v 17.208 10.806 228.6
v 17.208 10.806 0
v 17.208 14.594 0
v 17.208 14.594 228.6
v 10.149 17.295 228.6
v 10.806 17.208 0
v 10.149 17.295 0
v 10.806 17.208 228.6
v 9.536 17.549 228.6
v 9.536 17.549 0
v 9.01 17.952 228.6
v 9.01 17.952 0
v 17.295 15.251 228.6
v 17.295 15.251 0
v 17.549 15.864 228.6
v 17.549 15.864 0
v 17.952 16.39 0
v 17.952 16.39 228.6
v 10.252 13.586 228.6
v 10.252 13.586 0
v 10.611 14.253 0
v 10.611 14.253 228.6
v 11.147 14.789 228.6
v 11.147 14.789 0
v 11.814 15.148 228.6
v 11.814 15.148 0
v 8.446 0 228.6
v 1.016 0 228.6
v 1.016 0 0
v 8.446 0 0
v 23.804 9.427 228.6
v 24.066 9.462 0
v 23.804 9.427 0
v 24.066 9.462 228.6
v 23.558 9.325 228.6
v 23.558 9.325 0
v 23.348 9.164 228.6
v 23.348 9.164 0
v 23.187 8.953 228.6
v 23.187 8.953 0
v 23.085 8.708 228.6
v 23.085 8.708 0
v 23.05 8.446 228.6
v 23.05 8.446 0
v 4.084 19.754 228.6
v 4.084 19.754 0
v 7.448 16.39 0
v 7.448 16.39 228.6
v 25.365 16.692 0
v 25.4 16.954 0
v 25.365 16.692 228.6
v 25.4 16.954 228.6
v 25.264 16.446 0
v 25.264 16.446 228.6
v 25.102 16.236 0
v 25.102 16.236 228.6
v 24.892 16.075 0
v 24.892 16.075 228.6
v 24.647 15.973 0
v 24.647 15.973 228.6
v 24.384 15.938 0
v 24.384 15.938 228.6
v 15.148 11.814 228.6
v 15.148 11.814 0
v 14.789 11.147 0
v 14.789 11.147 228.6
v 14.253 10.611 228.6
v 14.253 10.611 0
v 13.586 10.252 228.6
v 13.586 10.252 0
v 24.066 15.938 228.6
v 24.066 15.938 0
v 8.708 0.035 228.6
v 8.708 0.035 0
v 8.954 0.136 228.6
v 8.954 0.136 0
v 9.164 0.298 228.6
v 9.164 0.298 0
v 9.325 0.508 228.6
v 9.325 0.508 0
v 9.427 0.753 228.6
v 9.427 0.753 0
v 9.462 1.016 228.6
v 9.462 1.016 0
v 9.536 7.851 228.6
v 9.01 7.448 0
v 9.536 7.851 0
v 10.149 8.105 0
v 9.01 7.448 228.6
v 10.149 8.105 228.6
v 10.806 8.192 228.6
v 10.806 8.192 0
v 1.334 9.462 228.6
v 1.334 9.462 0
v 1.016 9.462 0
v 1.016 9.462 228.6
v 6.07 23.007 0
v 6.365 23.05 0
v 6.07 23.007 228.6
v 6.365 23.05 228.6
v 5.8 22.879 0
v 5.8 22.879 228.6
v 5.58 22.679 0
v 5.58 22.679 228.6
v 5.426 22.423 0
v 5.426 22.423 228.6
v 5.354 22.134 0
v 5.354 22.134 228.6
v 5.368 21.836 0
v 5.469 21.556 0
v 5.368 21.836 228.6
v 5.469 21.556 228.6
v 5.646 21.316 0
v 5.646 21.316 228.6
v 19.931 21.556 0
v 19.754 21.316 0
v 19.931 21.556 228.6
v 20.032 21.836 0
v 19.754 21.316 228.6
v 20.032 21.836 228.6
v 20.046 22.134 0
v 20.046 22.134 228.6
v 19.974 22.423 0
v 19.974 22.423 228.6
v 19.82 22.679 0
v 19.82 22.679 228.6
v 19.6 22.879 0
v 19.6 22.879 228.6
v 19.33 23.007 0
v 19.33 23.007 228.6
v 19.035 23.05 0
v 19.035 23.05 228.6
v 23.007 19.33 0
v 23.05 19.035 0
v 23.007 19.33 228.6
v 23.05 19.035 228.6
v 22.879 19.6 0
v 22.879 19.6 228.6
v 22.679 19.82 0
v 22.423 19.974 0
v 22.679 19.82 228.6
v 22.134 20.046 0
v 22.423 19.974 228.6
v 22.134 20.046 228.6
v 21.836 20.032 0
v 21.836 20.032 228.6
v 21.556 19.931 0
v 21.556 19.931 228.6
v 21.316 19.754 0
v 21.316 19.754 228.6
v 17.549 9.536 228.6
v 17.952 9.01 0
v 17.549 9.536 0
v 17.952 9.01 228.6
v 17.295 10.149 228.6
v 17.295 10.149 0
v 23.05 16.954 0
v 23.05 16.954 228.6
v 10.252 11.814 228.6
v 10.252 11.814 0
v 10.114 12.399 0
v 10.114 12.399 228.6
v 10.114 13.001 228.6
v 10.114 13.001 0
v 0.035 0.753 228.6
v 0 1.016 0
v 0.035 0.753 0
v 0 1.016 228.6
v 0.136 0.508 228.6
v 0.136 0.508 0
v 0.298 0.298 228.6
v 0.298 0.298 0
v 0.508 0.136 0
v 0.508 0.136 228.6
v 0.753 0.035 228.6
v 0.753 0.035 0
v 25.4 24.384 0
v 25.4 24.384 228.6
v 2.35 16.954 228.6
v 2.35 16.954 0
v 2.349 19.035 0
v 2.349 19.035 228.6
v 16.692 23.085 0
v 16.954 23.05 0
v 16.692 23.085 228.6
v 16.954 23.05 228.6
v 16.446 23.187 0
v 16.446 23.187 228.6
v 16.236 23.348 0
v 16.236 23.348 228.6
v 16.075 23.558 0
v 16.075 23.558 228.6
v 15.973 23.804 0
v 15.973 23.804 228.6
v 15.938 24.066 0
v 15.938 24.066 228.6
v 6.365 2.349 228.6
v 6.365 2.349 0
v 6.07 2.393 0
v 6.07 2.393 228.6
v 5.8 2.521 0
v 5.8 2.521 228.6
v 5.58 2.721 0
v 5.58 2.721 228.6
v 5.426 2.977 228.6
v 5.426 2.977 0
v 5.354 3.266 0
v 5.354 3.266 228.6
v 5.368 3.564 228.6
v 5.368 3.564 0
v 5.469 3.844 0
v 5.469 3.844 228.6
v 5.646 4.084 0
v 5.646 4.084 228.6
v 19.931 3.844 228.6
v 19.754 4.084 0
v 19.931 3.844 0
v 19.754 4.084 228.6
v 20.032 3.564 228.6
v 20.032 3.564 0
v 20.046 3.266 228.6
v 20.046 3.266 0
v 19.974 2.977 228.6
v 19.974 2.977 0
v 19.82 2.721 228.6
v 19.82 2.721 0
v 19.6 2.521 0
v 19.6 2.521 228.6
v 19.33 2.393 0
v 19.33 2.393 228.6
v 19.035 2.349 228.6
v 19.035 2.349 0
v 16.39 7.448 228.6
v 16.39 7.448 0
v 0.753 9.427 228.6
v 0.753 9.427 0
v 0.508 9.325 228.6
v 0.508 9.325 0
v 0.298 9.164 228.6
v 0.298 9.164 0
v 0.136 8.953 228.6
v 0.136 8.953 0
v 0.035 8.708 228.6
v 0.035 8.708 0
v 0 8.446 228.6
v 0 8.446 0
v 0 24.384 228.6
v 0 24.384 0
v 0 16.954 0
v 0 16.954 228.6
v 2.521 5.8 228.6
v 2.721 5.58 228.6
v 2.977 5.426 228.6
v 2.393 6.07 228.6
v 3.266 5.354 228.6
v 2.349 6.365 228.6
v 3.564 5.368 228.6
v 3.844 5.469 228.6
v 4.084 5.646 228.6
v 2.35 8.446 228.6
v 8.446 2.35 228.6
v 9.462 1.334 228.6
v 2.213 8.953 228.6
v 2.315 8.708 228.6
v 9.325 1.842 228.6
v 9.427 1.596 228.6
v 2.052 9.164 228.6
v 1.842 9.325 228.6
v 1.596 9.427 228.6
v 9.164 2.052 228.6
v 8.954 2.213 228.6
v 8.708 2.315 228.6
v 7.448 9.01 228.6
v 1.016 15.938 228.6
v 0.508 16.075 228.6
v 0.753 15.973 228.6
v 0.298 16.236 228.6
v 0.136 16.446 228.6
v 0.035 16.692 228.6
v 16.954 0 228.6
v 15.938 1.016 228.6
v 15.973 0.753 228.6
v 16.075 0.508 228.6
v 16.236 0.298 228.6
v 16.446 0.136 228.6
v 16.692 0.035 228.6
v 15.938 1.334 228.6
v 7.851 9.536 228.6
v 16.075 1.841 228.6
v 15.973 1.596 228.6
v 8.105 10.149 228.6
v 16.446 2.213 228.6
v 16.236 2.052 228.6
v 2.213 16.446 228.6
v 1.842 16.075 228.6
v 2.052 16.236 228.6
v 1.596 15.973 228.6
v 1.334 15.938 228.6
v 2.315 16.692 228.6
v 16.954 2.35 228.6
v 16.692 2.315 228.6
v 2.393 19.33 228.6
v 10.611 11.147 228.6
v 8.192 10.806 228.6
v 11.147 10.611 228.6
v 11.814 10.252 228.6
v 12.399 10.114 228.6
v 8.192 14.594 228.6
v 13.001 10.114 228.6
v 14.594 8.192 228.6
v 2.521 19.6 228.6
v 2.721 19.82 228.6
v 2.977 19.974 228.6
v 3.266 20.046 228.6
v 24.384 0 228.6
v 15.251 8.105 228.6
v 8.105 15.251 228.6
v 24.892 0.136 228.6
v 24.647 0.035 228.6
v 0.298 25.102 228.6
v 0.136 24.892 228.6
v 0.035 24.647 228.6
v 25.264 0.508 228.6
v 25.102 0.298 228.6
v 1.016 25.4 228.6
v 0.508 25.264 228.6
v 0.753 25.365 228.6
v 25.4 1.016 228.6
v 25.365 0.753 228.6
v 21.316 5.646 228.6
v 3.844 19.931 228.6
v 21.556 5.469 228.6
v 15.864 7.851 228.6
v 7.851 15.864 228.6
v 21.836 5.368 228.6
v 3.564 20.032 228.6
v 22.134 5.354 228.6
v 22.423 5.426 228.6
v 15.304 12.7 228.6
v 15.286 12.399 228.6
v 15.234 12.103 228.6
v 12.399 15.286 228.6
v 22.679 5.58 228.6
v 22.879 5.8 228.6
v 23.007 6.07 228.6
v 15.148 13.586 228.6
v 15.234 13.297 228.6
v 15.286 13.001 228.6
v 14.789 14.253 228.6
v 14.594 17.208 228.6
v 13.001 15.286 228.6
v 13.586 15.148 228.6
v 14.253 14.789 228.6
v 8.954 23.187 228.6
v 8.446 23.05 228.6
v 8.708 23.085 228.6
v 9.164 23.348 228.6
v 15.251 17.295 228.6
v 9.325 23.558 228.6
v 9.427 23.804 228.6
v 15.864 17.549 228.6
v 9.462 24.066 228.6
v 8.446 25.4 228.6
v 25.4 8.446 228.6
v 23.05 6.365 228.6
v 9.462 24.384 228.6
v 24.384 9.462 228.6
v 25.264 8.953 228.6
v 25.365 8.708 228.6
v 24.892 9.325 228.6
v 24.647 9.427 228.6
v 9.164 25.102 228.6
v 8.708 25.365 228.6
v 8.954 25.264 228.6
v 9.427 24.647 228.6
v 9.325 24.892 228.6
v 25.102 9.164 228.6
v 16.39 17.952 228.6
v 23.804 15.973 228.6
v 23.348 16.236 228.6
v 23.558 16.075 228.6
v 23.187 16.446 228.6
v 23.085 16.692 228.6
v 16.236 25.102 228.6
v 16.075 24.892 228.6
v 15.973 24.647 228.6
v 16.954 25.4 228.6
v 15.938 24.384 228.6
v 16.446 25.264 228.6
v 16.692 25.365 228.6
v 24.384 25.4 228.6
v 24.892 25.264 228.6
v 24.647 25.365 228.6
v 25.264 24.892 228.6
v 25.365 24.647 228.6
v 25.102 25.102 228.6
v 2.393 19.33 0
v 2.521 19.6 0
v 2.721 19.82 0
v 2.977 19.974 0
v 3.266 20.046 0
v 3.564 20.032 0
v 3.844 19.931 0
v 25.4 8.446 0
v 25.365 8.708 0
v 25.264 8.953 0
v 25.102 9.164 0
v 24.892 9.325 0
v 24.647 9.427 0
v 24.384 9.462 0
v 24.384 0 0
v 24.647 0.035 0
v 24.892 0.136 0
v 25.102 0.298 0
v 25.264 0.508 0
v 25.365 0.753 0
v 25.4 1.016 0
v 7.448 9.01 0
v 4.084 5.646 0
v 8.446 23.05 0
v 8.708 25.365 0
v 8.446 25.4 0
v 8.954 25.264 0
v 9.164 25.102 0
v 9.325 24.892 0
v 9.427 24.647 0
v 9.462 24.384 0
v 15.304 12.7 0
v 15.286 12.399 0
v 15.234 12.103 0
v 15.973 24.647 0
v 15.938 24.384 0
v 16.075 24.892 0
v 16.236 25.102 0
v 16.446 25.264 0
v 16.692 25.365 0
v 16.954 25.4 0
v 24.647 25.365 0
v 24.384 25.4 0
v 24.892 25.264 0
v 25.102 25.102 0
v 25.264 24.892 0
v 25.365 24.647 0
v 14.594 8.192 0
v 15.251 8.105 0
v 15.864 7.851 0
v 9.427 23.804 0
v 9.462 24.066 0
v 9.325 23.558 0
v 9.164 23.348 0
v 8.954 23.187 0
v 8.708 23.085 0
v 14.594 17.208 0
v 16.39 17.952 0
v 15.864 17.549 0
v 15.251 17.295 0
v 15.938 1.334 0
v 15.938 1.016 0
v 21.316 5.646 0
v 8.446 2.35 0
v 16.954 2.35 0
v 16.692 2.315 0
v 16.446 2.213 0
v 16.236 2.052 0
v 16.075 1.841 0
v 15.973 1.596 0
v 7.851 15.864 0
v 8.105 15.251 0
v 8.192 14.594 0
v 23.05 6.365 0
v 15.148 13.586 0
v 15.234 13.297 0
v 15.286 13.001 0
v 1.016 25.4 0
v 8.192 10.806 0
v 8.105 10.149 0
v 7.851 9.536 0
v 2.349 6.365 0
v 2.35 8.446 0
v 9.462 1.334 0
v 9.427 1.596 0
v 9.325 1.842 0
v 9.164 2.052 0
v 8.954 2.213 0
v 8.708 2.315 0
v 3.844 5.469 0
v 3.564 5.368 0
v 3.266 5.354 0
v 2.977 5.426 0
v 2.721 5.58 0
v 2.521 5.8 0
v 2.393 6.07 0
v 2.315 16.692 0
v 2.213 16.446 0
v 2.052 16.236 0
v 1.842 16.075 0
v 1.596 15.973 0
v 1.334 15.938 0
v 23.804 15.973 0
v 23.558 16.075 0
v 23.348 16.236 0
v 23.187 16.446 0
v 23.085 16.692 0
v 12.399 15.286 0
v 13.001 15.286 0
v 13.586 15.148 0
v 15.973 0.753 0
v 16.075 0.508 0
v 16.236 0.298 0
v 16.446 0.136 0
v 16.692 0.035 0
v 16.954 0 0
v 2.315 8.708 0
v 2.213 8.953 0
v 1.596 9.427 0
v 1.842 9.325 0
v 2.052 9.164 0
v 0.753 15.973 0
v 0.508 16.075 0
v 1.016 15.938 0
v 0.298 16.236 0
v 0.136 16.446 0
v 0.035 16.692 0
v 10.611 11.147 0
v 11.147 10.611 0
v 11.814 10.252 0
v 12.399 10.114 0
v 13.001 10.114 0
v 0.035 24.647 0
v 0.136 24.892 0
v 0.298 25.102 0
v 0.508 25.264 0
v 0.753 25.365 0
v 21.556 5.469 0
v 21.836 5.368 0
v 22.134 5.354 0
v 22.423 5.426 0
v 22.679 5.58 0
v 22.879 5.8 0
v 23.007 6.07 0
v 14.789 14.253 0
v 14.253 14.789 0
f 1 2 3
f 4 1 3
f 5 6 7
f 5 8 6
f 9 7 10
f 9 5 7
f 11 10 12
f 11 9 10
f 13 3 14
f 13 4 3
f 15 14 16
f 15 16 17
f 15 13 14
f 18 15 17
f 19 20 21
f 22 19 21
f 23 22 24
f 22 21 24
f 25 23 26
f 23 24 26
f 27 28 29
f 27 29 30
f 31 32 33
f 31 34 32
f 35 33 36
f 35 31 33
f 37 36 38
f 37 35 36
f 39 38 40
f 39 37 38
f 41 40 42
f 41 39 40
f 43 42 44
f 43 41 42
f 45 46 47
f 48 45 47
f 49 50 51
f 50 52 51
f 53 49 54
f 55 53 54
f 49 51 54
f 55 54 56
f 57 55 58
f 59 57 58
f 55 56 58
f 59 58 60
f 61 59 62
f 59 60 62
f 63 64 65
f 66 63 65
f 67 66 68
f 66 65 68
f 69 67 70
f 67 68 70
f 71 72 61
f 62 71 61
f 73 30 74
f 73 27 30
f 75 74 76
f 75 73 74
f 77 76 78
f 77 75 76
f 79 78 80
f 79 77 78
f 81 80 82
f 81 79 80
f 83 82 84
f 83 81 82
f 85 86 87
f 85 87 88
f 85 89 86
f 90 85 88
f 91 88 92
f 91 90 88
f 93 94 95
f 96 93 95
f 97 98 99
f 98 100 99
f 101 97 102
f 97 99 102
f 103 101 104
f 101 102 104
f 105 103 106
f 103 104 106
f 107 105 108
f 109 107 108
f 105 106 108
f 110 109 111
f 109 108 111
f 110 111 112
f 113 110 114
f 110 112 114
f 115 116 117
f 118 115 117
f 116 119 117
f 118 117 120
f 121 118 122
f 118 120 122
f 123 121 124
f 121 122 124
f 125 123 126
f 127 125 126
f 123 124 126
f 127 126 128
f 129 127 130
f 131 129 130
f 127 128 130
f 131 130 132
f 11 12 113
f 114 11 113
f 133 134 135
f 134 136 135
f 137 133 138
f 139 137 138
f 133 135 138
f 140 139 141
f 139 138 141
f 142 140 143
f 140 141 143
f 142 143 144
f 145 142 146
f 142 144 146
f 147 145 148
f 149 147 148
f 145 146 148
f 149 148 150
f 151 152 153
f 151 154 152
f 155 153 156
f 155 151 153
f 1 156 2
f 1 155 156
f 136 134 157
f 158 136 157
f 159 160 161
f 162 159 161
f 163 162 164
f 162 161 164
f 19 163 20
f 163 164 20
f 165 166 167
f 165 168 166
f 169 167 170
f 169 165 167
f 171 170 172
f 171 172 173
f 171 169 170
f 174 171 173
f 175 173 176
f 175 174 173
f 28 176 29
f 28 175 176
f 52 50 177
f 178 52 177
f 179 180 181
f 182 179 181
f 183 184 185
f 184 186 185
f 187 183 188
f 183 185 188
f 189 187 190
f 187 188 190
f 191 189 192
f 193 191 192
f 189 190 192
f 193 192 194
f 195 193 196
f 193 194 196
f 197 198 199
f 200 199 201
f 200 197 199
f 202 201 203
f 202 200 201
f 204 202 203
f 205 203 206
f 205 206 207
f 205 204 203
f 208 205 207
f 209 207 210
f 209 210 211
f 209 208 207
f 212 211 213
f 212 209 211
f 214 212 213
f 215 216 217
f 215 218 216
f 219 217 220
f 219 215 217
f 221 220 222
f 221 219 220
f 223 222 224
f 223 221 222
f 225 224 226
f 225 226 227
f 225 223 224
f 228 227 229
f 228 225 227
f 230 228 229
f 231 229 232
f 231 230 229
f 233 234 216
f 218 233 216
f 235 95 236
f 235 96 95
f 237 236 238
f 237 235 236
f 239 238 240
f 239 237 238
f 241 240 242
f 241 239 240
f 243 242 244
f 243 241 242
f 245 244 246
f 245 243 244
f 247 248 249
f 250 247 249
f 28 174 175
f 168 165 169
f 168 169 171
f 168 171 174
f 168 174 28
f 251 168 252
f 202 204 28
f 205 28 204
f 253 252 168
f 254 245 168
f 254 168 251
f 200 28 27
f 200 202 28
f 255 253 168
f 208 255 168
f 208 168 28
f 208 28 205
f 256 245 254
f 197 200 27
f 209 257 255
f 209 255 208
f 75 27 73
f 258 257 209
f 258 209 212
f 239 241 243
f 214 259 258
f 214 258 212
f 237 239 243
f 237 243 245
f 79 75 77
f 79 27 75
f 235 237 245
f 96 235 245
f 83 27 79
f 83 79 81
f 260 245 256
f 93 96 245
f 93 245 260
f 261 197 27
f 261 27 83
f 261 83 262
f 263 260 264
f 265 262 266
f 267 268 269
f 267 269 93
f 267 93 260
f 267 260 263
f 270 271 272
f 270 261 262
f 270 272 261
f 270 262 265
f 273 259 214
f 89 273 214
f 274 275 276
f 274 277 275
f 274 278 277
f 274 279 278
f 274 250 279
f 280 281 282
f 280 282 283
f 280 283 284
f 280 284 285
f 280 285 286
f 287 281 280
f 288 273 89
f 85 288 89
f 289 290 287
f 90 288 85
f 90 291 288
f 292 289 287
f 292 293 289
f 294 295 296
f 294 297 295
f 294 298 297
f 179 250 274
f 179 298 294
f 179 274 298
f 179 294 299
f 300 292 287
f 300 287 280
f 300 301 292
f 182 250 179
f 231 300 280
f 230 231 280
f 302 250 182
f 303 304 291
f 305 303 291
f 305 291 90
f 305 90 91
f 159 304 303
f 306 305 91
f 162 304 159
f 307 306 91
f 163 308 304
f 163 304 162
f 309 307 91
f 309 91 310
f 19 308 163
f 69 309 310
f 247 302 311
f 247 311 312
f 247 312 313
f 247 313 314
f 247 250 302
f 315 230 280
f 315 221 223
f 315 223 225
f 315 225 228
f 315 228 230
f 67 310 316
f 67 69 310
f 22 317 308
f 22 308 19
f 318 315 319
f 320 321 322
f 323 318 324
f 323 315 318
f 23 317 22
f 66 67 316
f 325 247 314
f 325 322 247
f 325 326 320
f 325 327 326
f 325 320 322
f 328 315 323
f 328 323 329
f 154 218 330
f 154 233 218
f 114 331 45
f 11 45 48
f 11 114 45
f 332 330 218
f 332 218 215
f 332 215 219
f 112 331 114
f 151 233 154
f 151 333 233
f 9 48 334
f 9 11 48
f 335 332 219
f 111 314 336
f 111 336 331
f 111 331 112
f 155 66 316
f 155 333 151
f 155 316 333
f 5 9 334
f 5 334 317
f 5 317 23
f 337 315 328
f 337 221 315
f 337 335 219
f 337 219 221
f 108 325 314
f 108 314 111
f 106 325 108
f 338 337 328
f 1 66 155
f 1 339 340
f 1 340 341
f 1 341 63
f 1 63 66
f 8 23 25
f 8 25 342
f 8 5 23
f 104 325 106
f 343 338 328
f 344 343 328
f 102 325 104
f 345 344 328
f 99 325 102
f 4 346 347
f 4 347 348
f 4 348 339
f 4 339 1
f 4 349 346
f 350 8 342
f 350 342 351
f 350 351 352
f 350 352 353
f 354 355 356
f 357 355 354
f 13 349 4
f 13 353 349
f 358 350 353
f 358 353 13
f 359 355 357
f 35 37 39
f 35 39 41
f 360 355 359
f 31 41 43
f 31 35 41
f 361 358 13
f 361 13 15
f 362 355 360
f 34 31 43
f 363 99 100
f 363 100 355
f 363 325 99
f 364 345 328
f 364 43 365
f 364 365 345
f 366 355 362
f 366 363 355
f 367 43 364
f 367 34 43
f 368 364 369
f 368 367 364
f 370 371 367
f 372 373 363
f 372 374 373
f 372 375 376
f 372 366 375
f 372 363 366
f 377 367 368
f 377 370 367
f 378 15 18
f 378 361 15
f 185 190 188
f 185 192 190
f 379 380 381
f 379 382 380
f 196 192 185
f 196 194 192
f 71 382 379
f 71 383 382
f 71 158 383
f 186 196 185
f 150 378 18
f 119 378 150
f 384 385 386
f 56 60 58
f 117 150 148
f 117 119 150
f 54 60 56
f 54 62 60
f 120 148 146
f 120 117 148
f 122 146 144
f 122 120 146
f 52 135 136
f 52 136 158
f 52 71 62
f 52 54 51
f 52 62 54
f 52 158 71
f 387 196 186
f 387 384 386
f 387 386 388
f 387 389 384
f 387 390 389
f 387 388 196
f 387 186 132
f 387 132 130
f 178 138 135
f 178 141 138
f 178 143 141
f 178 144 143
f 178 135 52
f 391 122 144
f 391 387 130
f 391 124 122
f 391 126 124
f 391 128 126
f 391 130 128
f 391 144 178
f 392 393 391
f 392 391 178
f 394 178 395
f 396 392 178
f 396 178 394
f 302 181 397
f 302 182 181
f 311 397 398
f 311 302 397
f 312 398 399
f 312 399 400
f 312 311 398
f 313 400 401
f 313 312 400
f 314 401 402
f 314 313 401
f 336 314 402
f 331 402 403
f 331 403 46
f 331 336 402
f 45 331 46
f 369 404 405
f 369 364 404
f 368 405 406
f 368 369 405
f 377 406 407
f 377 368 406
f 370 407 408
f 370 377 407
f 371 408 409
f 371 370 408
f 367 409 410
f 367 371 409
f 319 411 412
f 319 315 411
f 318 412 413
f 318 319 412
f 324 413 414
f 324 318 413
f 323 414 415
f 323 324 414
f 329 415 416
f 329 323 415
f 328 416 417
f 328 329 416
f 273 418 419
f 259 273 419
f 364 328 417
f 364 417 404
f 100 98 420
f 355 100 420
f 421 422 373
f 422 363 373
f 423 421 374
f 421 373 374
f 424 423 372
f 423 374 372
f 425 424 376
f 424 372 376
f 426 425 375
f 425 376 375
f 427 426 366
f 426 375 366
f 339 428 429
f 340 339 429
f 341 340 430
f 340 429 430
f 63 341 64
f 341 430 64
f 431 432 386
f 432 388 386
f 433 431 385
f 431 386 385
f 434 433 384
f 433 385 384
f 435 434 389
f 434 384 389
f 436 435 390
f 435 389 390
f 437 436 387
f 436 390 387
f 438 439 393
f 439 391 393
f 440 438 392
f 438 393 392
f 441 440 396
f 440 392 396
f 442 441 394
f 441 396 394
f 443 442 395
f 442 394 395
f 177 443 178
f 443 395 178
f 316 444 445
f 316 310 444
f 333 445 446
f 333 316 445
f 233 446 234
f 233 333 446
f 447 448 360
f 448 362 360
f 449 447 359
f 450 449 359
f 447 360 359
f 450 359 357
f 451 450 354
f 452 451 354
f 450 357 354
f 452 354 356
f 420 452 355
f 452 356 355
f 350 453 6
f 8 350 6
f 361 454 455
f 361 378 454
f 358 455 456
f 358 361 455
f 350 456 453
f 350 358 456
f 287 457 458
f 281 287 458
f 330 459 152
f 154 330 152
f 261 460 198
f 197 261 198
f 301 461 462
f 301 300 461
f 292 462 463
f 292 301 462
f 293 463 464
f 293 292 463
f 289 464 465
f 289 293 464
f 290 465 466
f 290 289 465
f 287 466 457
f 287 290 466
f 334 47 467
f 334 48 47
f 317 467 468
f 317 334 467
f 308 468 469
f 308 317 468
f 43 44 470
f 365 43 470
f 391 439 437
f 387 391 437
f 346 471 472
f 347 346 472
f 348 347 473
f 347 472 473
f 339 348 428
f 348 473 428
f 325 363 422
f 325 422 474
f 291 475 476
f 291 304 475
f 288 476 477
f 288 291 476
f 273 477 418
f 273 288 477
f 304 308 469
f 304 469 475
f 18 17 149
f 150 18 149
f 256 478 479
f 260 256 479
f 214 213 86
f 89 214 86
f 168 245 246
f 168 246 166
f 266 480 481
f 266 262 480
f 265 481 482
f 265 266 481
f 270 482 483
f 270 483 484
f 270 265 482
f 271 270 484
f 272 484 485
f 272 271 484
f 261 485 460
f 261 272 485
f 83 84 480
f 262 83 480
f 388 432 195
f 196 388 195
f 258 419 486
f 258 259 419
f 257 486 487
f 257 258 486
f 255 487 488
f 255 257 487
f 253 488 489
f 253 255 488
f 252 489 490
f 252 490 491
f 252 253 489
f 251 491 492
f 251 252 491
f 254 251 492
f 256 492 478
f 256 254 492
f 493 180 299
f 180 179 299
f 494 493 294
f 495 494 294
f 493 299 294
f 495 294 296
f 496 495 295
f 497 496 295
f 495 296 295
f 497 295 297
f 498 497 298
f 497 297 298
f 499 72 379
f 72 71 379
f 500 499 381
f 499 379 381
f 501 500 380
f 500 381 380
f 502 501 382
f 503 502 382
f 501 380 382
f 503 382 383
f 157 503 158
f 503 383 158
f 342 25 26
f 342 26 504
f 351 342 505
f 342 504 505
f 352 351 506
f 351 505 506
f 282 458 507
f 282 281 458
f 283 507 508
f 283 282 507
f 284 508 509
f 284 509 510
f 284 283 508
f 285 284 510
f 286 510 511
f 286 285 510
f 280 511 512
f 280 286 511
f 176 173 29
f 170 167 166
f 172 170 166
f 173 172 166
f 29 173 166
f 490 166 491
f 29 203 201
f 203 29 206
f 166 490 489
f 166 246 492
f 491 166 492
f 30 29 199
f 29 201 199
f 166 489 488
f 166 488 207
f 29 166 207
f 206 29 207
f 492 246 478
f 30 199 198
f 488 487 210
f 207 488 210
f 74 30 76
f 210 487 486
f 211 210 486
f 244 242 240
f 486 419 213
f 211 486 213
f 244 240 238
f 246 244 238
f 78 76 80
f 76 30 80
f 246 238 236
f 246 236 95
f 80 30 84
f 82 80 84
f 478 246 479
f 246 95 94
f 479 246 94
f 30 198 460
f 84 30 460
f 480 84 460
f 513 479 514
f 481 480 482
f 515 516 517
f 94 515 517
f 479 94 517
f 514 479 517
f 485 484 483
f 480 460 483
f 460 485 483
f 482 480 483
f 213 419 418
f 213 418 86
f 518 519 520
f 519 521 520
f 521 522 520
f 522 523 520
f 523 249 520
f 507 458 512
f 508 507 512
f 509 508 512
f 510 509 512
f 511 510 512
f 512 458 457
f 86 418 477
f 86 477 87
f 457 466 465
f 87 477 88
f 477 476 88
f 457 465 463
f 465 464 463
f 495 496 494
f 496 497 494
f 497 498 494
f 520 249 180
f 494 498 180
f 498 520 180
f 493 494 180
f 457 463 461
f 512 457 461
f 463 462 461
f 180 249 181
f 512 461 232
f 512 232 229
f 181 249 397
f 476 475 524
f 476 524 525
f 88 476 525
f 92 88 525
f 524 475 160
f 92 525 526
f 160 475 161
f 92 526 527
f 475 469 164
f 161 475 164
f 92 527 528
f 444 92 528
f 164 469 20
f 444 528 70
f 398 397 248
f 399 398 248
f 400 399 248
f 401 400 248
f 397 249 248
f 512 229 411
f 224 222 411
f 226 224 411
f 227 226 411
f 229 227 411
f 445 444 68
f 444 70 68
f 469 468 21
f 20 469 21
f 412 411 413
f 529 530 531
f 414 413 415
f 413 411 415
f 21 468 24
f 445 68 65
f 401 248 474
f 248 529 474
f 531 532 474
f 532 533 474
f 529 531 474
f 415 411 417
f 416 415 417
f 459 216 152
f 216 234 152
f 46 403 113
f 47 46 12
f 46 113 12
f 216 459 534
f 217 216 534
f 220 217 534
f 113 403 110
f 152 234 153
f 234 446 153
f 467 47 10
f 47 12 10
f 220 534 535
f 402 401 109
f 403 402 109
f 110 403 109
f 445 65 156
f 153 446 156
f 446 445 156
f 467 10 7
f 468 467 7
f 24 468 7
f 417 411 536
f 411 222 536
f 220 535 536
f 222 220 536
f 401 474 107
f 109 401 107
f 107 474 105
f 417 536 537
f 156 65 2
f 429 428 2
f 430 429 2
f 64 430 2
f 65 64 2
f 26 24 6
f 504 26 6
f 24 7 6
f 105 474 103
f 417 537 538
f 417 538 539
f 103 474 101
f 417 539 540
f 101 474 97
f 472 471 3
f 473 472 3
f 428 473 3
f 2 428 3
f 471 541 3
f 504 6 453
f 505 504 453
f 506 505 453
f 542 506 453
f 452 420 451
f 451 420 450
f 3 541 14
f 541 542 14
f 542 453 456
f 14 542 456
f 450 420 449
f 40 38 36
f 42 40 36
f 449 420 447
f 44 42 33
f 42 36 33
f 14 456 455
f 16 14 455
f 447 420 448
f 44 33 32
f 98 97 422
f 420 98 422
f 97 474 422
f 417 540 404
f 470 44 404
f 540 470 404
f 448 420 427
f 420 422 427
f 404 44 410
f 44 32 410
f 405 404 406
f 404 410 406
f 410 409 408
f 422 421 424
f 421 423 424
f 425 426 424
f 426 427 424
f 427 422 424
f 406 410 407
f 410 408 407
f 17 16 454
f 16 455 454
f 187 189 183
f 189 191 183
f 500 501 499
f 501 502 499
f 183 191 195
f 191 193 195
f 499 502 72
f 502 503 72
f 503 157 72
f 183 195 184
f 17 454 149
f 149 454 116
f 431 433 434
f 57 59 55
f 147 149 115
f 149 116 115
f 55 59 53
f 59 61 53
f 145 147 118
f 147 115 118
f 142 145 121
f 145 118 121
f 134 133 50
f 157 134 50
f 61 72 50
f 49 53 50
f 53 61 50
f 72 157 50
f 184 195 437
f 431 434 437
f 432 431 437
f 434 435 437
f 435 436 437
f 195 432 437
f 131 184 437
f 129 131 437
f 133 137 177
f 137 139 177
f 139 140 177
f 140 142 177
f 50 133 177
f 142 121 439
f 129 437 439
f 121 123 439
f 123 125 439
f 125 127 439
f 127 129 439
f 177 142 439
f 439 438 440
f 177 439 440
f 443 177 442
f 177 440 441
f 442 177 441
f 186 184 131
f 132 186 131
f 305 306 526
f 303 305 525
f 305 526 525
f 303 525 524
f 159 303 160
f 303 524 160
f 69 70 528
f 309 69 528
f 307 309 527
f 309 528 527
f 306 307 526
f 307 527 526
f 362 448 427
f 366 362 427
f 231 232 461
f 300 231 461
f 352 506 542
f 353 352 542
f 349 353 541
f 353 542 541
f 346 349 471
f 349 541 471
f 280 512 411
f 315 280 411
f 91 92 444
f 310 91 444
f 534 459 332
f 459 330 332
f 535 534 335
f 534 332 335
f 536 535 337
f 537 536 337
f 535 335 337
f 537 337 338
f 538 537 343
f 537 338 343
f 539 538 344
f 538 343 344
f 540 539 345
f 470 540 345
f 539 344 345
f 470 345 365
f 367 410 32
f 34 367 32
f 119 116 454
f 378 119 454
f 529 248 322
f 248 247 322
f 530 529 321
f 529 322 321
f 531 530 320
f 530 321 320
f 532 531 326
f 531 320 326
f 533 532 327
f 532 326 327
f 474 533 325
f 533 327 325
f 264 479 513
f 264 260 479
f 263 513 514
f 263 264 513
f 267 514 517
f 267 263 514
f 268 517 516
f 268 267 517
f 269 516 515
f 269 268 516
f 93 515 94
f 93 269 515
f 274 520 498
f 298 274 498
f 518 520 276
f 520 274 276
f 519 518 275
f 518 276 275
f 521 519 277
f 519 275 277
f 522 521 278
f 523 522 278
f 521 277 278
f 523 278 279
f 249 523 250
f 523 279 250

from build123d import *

# Parameters (mm, degrees)
BOSS_EXTRUDE1_DEPTH = 228.6
FILLET1_R           = 2.54
FILLET2_R           = 1.016
FILLET3_R           = 1.016


with BuildPart() as part:
    # Sketch1 → Boss-Extrude1 (new body)
    with BuildSketch(Plane.XY):
        Polygon((1.562564565, 25.4), (3.912064565, 23.0505), (9.4615, 23.0505), (9.4615, 25.4), align=None)
        with BuildLine():
            Line((11.814337736, 15.148226829), (9.754064565, 17.2085))
            Line((9.754064565, 17.2085), (3.912064565, 23.0505))
            Line((3.912064565, 23.0505), (1.562564565, 25.4))
            Line((1.562564565, 25.4), (0, 25.4))
            Line((0, 25.4), (0, 23.837435435))
            Line((0, 23.837435435), (2.3495, 21.487935435))
            Line((2.3495, 21.487935435), (8.1915, 15.645935435))
            Line((8.1915, 15.645935435), (10.251773171, 13.585662264))
            ThreePointArc((10.251773171, 13.585662264), (10.859047495, 14.540952505), (11.814337736, 15.148226829))
        make_face()
        Polygon((2.3495, 15.9385), (2.3495, 21.487935435), (0, 23.837435435), (0, 15.9385), align=None)
        with BuildLine():
            Line((13.585662264, 15.148226829), (15.645935435, 17.2085))
            Line((15.645935435, 17.2085), (9.754064565, 17.2085))
            Line((9.754064565, 17.2085), (11.814337736, 15.148226829))
            ThreePointArc((11.814337736, 15.148226829), (12.7, 15.3035), (13.585662264, 15.148226829))
        make_face()
        with BuildLine():
            ThreePointArc((10.251773171, 11.814337736), (10.0965, 12.7), (10.251773171, 13.585662264))
            Line((10.251773171, 13.585662264), (8.1915, 15.645935435))
            Line((8.1915, 15.645935435), (8.1915, 9.754064565))
            Line((8.1915, 9.754064565), (10.251773171, 11.814337736))
        make_face()
        with BuildLine():
            ThreePointArc((11.814337736, 10.251773171), (10.859047495, 10.859047495), (10.251773171, 11.814337736))
            Line((10.251773171, 11.814337736), (8.1915, 9.754064565))
            Line((8.1915, 9.754064565), (2.3495, 3.912064565))
            Line((2.3495, 3.912064565), (0, 1.562564565))
            Line((0, 1.562564565), (0, 0))
            Line((0, 0), (1.562564565, 0))
            Line((1.562564565, 0), (3.912064565, 2.3495))
            Line((3.912064565, 2.3495), (9.754064565, 8.1915))
            Line((9.754064565, 8.1915), (11.814337736, 10.251773171))
        make_face()
        with BuildLine():
            ThreePointArc((13.585662264, 10.251773171), (12.7, 10.0965), (11.814337736, 10.251773171))
            Line((11.814337736, 10.251773171), (9.754064565, 8.1915))
            Line((9.754064565, 8.1915), (15.645935435, 8.1915))
            Line((15.645935435, 8.1915), (13.585662264, 10.251773171))
        make_face()
        with BuildLine():
            Line((17.2085, 9.754064565), (15.148226829, 11.814337736))
            ThreePointArc((15.148226829, 11.814337736), (14.540952505, 10.859047495), (13.585662264, 10.251773171))
            Line((13.585662264, 10.251773171), (15.645935435, 8.1915))
            Line((15.645935435, 8.1915), (21.487935435, 2.3495))
            Line((21.487935435, 2.3495), (23.837435435, 0))
            Line((23.837435435, 0), (25.4, 0))
            Line((25.4, 0), (25.4, 1.562564565))
            Line((25.4, 1.562564565), (23.0505, 3.912064565))
            Line((23.0505, 3.912064565), (17.2085, 9.754064565))
        make_face()
        with BuildLine():
            Line((17.2085, 15.645935435), (15.148226829, 13.585662264))
            ThreePointArc((15.148226829, 13.585662264), (15.264387919, 13.149585199), (15.3035, 12.7))
            ThreePointArc((15.3035, 12.7), (15.264387919, 12.250414801), (15.148226829, 11.814337736))
            Line((15.148226829, 11.814337736), (17.2085, 9.754064565))
            Line((17.2085, 9.754064565), (17.2085, 15.645935435))
        make_face()
        with BuildLine():
            Line((23.837435435, 25.4), (21.487935435, 23.0505))
            Line((21.487935435, 23.0505), (15.645935435, 17.2085))
            Line((15.645935435, 17.2085), (13.585662264, 15.148226829))
            ThreePointArc((13.585662264, 15.148226829), (14.540952505, 14.540952505), (15.148226829, 13.585662264))
            Line((15.148226829, 13.585662264), (17.2085, 15.645935435))
            Line((17.2085, 15.645935435), (23.0505, 21.487935435))
            Line((23.0505, 21.487935435), (25.4, 23.837435435))
            Line((25.4, 23.837435435), (25.4, 25.4))
            Line((25.4, 25.4), (23.837435435, 25.4))
        make_face()
        Polygon((15.9385, 23.0505), (21.487935435, 23.0505), (23.837435435, 25.4), (15.9385, 25.4), align=None)
        Polygon((25.4, 15.9385), (25.4, 23.837435435), (23.0505, 21.487935435), (23.0505, 15.9385), align=None)
        Polygon((23.0505, 9.4615), (23.0505, 3.912064565), (25.4, 1.562564565), (25.4, 9.4615), align=None)
        Polygon((23.837435435, 0), (21.487935435, 2.3495), (15.9385, 2.3495), (15.9385, 0), align=None)
        Polygon((9.4615, 2.3495), (3.912064565, 2.3495), (1.562564565, 0), (9.4615, 0), align=None)
        Polygon((0, 1.562564565), (2.3495, 3.912064565), (2.3495, 9.4615), (0, 9.4615), align=None)
    extrude(amount=BOSS_EXTRUDE1_DEPTH)

    # Fillet1
    fillet1_edges = [part.edges().sort_by_distance(p)[0] for p in [
        (15.645935435, 8.1915, 114.3),
        (9.754064565, 8.1915, 114.3),
        (8.1915, 9.754064565, 114.3),
        (8.1915, 15.645935435, 114.3),
        (9.754064565, 17.2085, 114.3),
        (15.645935435, 17.2085, 114.3),
        (17.2085, 15.645935435, 114.3),
        (17.2085, 9.754064565, 114.3),
    ]]
    fillet(fillet1_edges, radius=FILLET1_R)

    # Fillet2
    fillet2_edges = [part.edges().sort_by_distance(p)[0] for p in [
        (23.0505, 9.4615, 114.3),
        (25.4, 9.4615, 114.3),
        (25.4, 0, 114.3),
        (15.9385, 0, 114.3),
        (15.9385, 2.3495, 114.3),
        (9.4615, 2.3495, 114.3),
        (9.4615, 0, 114.3),
        (0, 0, 114.3),
        (0, 9.4615, 114.3),
        (2.3495, 9.4615, 114.3),
        (2.3495, 15.9385, 114.3),
        (0, 15.9385, 114.3),
        (0, 25.4, 114.3),
        (9.4615, 25.4, 114.3),
        (9.4615, 23.0505, 114.3),
        (15.9385, 23.0505, 114.3),
        (15.9385, 25.4, 114.3),
        (25.4, 25.4, 114.3),
        (25.4, 15.9385, 114.3),
        (23.0505, 15.9385, 114.3),
    ]]
    fillet(fillet2_edges, radius=FILLET2_R)

    # Fillet3
    fillet3_edges = [part.edges().sort_by_distance(p)[0] for p in [
        (23.0505, 3.912064565, 114.3),
        (21.487935435, 2.3495, 114.3),
        (3.912064565, 2.3495, 114.3),
        (2.3495, 3.912064565, 114.3),
        (2.3495, 21.487935435, 114.3),
        (3.912064565, 23.0505, 114.3),
        (21.487935435, 23.0505, 114.3),
        (23.0505, 21.487935435, 114.3),
    ]]
    fillet(fillet3_edges, radius=FILLET3_R)


solid = part.part
